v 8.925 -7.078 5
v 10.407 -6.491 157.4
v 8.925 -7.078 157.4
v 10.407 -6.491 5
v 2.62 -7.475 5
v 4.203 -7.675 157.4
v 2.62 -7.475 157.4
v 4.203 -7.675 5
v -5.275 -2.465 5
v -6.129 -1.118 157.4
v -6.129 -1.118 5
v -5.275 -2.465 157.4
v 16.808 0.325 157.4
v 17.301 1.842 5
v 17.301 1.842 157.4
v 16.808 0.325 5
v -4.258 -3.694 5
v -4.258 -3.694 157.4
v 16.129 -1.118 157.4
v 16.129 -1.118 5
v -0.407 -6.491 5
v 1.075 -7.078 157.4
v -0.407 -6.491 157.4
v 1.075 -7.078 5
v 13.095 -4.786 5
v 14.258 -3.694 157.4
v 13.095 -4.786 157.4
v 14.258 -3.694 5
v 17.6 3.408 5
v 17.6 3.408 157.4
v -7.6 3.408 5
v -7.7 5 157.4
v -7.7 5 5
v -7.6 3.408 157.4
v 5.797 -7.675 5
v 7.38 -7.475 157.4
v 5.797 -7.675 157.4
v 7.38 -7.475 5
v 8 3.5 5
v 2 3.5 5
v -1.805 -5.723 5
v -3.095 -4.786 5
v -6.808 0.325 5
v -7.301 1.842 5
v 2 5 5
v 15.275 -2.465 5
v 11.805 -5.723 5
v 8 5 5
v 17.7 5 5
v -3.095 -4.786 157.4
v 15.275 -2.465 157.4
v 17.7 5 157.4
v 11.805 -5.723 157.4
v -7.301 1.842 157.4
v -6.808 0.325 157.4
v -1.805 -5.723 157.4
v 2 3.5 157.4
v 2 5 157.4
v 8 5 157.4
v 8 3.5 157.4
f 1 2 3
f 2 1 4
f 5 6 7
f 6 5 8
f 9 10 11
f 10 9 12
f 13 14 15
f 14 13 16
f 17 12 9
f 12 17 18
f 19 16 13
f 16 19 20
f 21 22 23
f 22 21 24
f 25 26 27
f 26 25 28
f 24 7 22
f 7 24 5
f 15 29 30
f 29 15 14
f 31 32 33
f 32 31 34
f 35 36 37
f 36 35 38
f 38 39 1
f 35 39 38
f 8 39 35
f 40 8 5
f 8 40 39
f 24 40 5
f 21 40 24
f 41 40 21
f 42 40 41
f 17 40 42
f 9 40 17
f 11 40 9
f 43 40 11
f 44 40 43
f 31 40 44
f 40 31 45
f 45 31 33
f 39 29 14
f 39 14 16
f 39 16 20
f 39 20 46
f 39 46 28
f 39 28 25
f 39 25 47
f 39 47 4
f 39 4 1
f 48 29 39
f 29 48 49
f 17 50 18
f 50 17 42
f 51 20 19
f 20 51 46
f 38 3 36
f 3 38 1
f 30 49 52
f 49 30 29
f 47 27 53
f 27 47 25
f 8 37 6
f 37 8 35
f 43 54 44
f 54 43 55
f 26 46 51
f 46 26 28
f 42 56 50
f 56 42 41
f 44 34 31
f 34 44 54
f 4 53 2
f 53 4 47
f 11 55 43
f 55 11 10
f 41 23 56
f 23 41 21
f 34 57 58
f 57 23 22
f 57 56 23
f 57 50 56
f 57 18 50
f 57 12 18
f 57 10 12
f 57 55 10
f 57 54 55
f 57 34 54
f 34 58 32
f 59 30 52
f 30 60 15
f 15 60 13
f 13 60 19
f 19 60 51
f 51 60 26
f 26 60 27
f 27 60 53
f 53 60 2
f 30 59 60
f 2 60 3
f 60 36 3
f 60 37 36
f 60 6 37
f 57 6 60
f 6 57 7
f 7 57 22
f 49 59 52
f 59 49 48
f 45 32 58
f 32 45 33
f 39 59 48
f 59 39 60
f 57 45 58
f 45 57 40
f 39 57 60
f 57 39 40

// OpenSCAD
smooth = 50;
one_inch_in_mm = 25.4;
segment_length = one_inch_in_mm * 6;
led_channel_width = 6;
led_channel_height = 3;

module diffuser_piece() {
    difference() {
        cylinder(h = segment_length, d = one_inch_in_mm, $fn=smooth);
        translate([0,one_inch_in_mm/2,segment_length/2]) cube([one_inch_in_mm,one_inch_in_mm,segment_length], center=true);
        translate([0,0,segment_length/2]) cube([led_channel_width,led_channel_height,segment_length], center=true);
    }
}

translate([5,5,5]) diffuser_piece();
